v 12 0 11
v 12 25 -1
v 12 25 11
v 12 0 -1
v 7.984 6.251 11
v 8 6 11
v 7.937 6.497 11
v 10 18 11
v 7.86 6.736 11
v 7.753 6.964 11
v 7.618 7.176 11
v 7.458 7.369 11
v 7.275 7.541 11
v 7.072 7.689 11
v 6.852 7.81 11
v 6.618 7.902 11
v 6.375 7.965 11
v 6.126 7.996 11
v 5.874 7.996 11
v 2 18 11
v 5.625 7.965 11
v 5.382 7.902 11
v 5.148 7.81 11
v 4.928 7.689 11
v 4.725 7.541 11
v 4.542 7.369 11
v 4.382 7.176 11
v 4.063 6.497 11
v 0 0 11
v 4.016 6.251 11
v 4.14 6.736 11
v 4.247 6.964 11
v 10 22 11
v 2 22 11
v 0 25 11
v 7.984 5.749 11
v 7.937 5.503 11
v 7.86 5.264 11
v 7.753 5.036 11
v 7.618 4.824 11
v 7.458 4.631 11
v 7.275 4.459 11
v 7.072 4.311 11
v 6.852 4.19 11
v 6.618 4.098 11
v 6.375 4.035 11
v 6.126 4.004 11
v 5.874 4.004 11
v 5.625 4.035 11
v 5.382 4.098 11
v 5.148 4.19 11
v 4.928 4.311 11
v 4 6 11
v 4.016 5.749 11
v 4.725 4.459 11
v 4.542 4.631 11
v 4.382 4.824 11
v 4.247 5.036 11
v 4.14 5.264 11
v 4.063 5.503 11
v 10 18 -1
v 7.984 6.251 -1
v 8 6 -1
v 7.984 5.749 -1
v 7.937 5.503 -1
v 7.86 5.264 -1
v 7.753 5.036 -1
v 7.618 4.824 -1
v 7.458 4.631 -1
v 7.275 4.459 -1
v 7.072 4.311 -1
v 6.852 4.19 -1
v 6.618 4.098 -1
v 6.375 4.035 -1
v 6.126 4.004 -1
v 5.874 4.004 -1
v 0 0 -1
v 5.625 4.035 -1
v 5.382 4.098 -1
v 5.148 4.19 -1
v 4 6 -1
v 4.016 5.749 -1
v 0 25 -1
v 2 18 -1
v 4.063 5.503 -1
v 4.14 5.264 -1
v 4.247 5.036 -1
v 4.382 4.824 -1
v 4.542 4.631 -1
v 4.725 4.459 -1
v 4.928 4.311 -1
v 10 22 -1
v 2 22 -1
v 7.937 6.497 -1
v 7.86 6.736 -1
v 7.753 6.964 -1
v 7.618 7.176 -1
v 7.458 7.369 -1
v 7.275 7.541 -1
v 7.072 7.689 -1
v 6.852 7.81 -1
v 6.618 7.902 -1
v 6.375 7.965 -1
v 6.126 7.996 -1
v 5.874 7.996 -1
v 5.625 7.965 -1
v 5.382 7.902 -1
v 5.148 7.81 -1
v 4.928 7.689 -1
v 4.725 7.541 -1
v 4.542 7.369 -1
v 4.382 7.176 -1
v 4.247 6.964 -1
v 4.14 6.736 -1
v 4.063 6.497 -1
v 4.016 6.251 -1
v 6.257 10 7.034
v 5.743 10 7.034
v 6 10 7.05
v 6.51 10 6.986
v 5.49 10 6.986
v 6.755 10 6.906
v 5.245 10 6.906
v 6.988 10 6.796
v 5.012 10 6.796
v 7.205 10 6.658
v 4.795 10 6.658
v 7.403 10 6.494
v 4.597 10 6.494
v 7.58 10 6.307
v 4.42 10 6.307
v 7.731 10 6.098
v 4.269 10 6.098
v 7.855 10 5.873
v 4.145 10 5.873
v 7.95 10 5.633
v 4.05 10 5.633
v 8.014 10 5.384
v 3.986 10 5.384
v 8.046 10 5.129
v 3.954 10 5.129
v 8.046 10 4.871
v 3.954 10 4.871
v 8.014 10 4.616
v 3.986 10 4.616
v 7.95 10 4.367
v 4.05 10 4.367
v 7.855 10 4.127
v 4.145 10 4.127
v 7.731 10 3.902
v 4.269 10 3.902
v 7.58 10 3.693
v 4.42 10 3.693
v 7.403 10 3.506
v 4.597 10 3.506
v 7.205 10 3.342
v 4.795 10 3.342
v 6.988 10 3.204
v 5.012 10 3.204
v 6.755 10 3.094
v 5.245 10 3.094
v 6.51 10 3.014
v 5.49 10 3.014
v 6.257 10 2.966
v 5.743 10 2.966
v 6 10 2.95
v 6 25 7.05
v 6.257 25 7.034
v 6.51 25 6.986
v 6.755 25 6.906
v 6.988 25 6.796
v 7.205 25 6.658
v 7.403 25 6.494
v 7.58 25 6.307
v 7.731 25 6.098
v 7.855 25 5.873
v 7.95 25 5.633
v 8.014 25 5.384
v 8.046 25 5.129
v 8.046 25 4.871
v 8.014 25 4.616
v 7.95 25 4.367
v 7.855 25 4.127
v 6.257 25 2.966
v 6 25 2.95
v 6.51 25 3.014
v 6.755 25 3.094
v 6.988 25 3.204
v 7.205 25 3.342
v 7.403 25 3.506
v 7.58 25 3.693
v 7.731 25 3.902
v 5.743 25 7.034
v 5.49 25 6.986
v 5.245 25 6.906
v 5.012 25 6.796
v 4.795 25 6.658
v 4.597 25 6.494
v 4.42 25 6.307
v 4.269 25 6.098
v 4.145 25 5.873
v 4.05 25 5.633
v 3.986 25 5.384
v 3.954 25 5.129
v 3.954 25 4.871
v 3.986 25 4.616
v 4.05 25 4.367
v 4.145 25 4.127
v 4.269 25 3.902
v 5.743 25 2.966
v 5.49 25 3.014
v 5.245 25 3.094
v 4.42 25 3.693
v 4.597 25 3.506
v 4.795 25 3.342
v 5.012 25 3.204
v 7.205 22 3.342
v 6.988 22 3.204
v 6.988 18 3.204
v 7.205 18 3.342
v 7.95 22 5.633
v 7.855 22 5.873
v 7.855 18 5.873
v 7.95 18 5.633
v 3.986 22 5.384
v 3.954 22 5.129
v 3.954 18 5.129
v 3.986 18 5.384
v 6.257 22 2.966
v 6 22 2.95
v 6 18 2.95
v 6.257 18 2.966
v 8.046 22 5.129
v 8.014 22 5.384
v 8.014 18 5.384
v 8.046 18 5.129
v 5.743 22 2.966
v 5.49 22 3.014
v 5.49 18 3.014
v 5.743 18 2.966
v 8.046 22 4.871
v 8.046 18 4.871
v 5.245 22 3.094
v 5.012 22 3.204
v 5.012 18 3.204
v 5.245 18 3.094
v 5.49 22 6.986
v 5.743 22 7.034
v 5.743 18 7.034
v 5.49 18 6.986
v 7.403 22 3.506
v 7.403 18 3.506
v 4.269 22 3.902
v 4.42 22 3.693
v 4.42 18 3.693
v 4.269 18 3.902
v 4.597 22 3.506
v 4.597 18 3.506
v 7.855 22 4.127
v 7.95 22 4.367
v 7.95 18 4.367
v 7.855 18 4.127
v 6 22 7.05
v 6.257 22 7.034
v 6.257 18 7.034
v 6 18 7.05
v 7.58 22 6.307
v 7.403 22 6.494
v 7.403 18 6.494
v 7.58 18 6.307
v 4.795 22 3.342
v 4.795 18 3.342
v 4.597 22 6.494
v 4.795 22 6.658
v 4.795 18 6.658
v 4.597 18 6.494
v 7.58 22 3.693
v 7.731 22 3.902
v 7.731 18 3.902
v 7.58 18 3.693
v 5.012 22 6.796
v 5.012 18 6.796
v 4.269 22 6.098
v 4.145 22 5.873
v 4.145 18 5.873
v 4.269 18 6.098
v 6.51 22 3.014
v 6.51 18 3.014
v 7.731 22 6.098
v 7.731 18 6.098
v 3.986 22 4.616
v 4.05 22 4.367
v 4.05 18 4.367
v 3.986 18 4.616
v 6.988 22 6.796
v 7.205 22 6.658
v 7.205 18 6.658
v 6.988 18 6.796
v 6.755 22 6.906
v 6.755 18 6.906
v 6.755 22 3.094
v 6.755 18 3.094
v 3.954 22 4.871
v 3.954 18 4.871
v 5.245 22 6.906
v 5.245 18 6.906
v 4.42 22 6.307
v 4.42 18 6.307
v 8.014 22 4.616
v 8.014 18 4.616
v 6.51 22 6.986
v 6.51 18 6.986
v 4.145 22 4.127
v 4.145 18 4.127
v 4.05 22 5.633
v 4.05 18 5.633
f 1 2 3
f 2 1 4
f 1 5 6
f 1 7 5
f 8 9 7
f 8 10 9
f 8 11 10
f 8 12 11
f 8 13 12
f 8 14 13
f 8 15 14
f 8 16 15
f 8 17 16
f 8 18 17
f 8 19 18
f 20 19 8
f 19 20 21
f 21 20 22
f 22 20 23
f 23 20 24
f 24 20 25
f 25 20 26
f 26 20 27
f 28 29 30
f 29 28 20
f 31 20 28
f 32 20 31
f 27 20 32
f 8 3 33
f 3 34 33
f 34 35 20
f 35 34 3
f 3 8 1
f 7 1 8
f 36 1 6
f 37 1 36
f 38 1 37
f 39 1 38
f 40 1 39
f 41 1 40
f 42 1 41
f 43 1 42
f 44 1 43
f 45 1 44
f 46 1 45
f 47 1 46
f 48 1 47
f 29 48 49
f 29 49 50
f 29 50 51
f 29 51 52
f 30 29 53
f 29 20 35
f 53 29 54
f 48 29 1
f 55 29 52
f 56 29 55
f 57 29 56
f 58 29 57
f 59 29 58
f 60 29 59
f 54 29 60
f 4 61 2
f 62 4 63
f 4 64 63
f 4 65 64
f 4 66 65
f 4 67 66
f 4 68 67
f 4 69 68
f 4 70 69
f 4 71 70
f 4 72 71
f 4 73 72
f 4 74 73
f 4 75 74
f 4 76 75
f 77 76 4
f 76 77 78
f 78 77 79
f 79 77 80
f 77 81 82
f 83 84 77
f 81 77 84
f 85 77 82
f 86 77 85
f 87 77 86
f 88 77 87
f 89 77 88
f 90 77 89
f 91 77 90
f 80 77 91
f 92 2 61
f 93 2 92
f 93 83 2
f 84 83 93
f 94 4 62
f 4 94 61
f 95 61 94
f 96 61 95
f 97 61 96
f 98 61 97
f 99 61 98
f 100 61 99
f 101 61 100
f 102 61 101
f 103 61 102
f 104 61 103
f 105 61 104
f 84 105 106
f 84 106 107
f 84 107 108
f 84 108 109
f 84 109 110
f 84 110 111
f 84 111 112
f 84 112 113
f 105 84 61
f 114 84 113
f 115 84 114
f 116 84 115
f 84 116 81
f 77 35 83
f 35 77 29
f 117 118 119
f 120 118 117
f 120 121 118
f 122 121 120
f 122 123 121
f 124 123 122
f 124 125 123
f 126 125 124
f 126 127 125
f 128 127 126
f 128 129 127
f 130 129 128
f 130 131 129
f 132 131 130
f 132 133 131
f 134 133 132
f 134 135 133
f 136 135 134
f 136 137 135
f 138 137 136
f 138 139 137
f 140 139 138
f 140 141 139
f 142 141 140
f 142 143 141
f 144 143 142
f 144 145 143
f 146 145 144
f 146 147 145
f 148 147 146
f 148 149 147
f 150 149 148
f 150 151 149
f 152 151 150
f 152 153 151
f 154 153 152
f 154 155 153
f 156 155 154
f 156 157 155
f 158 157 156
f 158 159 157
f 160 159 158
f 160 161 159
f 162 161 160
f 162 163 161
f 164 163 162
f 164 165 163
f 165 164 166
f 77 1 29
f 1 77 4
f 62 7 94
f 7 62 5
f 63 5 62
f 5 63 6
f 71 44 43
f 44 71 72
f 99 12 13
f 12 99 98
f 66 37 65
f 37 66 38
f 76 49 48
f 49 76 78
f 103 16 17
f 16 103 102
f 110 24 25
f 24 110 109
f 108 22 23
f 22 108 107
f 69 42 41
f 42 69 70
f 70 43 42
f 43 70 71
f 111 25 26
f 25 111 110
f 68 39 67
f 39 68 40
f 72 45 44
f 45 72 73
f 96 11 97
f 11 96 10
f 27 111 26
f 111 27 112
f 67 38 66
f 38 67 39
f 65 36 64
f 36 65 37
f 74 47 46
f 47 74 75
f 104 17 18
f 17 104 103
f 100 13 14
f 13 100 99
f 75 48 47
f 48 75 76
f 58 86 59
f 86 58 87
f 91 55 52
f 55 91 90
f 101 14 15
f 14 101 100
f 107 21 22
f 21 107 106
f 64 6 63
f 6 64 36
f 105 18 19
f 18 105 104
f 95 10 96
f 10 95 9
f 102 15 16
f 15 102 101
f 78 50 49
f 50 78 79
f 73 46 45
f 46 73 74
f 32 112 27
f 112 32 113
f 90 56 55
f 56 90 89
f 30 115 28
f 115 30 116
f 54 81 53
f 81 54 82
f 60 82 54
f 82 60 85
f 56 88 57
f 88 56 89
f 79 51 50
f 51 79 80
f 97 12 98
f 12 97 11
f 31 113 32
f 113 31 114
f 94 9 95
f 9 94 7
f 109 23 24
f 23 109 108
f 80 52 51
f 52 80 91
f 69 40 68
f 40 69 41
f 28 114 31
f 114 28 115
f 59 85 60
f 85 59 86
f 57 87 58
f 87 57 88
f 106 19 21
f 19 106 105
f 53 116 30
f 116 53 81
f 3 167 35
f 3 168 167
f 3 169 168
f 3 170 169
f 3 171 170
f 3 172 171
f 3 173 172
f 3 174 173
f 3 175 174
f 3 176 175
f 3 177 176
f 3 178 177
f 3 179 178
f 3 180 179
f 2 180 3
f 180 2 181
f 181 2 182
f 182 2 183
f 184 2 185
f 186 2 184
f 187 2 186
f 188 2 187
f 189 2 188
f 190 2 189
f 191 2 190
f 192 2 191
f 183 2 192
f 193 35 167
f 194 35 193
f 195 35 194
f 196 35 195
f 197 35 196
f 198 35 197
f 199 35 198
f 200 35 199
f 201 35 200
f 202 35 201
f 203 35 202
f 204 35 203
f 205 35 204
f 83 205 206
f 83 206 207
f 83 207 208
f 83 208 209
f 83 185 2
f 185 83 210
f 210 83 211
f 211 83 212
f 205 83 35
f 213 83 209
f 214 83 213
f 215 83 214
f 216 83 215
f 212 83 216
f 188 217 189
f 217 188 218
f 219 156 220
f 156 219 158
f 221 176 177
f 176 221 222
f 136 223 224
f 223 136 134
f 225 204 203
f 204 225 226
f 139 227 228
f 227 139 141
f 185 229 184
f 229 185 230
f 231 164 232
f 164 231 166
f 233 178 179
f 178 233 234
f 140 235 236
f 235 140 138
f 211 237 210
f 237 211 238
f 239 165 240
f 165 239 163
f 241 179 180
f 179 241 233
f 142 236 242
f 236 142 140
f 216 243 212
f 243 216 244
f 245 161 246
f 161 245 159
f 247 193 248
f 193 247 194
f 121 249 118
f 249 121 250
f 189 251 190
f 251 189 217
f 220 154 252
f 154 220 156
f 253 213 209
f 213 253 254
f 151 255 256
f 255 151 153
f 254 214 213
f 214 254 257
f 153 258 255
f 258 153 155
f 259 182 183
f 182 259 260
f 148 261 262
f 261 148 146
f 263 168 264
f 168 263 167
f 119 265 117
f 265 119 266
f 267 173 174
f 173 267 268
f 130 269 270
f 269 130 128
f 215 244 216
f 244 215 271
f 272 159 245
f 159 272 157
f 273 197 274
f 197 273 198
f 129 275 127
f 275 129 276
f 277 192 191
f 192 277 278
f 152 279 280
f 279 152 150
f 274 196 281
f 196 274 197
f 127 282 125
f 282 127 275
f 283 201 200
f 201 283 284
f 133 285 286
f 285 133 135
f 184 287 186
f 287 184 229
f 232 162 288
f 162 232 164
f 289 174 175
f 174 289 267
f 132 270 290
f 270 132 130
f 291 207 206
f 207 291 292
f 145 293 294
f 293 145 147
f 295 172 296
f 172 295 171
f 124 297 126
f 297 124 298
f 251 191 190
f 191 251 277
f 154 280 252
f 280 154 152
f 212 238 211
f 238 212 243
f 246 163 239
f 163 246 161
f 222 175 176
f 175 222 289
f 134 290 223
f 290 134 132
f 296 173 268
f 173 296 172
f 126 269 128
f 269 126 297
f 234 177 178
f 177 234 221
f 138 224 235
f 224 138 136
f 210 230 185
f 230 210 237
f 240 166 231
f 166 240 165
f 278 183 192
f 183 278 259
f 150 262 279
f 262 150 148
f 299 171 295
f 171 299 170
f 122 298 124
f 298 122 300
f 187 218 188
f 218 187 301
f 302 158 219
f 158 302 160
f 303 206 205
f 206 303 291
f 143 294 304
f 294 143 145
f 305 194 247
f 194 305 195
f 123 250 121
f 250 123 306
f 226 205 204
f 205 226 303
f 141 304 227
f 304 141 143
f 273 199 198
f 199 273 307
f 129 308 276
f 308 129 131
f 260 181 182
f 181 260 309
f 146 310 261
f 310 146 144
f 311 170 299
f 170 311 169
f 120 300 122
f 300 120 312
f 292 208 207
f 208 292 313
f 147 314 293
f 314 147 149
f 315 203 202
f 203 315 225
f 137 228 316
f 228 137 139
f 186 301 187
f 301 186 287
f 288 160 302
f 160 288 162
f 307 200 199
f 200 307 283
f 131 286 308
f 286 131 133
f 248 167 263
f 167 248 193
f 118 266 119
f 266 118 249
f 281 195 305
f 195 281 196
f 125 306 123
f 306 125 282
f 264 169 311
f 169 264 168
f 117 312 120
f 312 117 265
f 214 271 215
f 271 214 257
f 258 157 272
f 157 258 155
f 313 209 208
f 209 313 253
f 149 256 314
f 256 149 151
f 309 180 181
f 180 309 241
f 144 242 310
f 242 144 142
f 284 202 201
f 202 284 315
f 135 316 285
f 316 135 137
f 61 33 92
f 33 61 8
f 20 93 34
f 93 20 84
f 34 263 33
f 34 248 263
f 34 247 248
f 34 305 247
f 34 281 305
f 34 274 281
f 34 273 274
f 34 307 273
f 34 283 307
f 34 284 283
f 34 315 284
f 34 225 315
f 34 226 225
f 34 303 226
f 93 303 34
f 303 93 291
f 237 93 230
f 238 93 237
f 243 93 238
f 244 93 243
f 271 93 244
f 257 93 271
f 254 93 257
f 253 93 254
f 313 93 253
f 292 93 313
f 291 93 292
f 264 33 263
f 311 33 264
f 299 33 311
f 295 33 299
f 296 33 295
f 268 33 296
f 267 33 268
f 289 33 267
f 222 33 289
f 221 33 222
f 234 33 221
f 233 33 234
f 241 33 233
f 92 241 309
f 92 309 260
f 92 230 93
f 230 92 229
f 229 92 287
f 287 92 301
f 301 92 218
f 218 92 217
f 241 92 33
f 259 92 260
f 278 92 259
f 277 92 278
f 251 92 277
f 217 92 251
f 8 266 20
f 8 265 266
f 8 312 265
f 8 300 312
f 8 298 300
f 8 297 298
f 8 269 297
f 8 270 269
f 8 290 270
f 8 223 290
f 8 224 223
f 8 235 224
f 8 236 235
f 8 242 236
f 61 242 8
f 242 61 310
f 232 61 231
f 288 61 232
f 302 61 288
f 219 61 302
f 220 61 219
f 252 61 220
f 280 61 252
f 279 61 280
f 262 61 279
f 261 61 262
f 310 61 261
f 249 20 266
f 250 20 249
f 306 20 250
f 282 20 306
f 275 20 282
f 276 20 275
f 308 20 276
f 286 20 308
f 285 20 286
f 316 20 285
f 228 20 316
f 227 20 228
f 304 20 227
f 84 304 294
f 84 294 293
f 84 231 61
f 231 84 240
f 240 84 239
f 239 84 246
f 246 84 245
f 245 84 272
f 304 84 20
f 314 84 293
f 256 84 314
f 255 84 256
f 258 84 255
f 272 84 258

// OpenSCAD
$fn=50;

//difference()//forchetta
//	{
//	union()
//		{
//		translate([0,0,-1]) cube([3,15,12]);
//		translate([9,0,-1]) cube([3,15,12]);
//		
//		translate([0,0,5]) rotate ([0,90,0]) cylinder(d=12,h=3);
//		translate([9,0,5]) rotate ([0,90,0]) cylinder(d=12,h=3);
//		}
//	translate([-5,0,5]) rotate([0,90,0]) cylinder(d=6.5,h=20);
//	}

difference()
	{
	translate([0,0,-1]) cube([12,10,12]);
	translate([6,6,-2]) cylinder(d=4,h=14);
	}

difference()
	{
	translate([0,10,-1]) cube([12,15,12]);
	translate([6,28,5]) rotate([90,90,0]) cylinder(d=4.1,h=20);
	translate([2,18,-2]) cube([8,4,20]);
	}
